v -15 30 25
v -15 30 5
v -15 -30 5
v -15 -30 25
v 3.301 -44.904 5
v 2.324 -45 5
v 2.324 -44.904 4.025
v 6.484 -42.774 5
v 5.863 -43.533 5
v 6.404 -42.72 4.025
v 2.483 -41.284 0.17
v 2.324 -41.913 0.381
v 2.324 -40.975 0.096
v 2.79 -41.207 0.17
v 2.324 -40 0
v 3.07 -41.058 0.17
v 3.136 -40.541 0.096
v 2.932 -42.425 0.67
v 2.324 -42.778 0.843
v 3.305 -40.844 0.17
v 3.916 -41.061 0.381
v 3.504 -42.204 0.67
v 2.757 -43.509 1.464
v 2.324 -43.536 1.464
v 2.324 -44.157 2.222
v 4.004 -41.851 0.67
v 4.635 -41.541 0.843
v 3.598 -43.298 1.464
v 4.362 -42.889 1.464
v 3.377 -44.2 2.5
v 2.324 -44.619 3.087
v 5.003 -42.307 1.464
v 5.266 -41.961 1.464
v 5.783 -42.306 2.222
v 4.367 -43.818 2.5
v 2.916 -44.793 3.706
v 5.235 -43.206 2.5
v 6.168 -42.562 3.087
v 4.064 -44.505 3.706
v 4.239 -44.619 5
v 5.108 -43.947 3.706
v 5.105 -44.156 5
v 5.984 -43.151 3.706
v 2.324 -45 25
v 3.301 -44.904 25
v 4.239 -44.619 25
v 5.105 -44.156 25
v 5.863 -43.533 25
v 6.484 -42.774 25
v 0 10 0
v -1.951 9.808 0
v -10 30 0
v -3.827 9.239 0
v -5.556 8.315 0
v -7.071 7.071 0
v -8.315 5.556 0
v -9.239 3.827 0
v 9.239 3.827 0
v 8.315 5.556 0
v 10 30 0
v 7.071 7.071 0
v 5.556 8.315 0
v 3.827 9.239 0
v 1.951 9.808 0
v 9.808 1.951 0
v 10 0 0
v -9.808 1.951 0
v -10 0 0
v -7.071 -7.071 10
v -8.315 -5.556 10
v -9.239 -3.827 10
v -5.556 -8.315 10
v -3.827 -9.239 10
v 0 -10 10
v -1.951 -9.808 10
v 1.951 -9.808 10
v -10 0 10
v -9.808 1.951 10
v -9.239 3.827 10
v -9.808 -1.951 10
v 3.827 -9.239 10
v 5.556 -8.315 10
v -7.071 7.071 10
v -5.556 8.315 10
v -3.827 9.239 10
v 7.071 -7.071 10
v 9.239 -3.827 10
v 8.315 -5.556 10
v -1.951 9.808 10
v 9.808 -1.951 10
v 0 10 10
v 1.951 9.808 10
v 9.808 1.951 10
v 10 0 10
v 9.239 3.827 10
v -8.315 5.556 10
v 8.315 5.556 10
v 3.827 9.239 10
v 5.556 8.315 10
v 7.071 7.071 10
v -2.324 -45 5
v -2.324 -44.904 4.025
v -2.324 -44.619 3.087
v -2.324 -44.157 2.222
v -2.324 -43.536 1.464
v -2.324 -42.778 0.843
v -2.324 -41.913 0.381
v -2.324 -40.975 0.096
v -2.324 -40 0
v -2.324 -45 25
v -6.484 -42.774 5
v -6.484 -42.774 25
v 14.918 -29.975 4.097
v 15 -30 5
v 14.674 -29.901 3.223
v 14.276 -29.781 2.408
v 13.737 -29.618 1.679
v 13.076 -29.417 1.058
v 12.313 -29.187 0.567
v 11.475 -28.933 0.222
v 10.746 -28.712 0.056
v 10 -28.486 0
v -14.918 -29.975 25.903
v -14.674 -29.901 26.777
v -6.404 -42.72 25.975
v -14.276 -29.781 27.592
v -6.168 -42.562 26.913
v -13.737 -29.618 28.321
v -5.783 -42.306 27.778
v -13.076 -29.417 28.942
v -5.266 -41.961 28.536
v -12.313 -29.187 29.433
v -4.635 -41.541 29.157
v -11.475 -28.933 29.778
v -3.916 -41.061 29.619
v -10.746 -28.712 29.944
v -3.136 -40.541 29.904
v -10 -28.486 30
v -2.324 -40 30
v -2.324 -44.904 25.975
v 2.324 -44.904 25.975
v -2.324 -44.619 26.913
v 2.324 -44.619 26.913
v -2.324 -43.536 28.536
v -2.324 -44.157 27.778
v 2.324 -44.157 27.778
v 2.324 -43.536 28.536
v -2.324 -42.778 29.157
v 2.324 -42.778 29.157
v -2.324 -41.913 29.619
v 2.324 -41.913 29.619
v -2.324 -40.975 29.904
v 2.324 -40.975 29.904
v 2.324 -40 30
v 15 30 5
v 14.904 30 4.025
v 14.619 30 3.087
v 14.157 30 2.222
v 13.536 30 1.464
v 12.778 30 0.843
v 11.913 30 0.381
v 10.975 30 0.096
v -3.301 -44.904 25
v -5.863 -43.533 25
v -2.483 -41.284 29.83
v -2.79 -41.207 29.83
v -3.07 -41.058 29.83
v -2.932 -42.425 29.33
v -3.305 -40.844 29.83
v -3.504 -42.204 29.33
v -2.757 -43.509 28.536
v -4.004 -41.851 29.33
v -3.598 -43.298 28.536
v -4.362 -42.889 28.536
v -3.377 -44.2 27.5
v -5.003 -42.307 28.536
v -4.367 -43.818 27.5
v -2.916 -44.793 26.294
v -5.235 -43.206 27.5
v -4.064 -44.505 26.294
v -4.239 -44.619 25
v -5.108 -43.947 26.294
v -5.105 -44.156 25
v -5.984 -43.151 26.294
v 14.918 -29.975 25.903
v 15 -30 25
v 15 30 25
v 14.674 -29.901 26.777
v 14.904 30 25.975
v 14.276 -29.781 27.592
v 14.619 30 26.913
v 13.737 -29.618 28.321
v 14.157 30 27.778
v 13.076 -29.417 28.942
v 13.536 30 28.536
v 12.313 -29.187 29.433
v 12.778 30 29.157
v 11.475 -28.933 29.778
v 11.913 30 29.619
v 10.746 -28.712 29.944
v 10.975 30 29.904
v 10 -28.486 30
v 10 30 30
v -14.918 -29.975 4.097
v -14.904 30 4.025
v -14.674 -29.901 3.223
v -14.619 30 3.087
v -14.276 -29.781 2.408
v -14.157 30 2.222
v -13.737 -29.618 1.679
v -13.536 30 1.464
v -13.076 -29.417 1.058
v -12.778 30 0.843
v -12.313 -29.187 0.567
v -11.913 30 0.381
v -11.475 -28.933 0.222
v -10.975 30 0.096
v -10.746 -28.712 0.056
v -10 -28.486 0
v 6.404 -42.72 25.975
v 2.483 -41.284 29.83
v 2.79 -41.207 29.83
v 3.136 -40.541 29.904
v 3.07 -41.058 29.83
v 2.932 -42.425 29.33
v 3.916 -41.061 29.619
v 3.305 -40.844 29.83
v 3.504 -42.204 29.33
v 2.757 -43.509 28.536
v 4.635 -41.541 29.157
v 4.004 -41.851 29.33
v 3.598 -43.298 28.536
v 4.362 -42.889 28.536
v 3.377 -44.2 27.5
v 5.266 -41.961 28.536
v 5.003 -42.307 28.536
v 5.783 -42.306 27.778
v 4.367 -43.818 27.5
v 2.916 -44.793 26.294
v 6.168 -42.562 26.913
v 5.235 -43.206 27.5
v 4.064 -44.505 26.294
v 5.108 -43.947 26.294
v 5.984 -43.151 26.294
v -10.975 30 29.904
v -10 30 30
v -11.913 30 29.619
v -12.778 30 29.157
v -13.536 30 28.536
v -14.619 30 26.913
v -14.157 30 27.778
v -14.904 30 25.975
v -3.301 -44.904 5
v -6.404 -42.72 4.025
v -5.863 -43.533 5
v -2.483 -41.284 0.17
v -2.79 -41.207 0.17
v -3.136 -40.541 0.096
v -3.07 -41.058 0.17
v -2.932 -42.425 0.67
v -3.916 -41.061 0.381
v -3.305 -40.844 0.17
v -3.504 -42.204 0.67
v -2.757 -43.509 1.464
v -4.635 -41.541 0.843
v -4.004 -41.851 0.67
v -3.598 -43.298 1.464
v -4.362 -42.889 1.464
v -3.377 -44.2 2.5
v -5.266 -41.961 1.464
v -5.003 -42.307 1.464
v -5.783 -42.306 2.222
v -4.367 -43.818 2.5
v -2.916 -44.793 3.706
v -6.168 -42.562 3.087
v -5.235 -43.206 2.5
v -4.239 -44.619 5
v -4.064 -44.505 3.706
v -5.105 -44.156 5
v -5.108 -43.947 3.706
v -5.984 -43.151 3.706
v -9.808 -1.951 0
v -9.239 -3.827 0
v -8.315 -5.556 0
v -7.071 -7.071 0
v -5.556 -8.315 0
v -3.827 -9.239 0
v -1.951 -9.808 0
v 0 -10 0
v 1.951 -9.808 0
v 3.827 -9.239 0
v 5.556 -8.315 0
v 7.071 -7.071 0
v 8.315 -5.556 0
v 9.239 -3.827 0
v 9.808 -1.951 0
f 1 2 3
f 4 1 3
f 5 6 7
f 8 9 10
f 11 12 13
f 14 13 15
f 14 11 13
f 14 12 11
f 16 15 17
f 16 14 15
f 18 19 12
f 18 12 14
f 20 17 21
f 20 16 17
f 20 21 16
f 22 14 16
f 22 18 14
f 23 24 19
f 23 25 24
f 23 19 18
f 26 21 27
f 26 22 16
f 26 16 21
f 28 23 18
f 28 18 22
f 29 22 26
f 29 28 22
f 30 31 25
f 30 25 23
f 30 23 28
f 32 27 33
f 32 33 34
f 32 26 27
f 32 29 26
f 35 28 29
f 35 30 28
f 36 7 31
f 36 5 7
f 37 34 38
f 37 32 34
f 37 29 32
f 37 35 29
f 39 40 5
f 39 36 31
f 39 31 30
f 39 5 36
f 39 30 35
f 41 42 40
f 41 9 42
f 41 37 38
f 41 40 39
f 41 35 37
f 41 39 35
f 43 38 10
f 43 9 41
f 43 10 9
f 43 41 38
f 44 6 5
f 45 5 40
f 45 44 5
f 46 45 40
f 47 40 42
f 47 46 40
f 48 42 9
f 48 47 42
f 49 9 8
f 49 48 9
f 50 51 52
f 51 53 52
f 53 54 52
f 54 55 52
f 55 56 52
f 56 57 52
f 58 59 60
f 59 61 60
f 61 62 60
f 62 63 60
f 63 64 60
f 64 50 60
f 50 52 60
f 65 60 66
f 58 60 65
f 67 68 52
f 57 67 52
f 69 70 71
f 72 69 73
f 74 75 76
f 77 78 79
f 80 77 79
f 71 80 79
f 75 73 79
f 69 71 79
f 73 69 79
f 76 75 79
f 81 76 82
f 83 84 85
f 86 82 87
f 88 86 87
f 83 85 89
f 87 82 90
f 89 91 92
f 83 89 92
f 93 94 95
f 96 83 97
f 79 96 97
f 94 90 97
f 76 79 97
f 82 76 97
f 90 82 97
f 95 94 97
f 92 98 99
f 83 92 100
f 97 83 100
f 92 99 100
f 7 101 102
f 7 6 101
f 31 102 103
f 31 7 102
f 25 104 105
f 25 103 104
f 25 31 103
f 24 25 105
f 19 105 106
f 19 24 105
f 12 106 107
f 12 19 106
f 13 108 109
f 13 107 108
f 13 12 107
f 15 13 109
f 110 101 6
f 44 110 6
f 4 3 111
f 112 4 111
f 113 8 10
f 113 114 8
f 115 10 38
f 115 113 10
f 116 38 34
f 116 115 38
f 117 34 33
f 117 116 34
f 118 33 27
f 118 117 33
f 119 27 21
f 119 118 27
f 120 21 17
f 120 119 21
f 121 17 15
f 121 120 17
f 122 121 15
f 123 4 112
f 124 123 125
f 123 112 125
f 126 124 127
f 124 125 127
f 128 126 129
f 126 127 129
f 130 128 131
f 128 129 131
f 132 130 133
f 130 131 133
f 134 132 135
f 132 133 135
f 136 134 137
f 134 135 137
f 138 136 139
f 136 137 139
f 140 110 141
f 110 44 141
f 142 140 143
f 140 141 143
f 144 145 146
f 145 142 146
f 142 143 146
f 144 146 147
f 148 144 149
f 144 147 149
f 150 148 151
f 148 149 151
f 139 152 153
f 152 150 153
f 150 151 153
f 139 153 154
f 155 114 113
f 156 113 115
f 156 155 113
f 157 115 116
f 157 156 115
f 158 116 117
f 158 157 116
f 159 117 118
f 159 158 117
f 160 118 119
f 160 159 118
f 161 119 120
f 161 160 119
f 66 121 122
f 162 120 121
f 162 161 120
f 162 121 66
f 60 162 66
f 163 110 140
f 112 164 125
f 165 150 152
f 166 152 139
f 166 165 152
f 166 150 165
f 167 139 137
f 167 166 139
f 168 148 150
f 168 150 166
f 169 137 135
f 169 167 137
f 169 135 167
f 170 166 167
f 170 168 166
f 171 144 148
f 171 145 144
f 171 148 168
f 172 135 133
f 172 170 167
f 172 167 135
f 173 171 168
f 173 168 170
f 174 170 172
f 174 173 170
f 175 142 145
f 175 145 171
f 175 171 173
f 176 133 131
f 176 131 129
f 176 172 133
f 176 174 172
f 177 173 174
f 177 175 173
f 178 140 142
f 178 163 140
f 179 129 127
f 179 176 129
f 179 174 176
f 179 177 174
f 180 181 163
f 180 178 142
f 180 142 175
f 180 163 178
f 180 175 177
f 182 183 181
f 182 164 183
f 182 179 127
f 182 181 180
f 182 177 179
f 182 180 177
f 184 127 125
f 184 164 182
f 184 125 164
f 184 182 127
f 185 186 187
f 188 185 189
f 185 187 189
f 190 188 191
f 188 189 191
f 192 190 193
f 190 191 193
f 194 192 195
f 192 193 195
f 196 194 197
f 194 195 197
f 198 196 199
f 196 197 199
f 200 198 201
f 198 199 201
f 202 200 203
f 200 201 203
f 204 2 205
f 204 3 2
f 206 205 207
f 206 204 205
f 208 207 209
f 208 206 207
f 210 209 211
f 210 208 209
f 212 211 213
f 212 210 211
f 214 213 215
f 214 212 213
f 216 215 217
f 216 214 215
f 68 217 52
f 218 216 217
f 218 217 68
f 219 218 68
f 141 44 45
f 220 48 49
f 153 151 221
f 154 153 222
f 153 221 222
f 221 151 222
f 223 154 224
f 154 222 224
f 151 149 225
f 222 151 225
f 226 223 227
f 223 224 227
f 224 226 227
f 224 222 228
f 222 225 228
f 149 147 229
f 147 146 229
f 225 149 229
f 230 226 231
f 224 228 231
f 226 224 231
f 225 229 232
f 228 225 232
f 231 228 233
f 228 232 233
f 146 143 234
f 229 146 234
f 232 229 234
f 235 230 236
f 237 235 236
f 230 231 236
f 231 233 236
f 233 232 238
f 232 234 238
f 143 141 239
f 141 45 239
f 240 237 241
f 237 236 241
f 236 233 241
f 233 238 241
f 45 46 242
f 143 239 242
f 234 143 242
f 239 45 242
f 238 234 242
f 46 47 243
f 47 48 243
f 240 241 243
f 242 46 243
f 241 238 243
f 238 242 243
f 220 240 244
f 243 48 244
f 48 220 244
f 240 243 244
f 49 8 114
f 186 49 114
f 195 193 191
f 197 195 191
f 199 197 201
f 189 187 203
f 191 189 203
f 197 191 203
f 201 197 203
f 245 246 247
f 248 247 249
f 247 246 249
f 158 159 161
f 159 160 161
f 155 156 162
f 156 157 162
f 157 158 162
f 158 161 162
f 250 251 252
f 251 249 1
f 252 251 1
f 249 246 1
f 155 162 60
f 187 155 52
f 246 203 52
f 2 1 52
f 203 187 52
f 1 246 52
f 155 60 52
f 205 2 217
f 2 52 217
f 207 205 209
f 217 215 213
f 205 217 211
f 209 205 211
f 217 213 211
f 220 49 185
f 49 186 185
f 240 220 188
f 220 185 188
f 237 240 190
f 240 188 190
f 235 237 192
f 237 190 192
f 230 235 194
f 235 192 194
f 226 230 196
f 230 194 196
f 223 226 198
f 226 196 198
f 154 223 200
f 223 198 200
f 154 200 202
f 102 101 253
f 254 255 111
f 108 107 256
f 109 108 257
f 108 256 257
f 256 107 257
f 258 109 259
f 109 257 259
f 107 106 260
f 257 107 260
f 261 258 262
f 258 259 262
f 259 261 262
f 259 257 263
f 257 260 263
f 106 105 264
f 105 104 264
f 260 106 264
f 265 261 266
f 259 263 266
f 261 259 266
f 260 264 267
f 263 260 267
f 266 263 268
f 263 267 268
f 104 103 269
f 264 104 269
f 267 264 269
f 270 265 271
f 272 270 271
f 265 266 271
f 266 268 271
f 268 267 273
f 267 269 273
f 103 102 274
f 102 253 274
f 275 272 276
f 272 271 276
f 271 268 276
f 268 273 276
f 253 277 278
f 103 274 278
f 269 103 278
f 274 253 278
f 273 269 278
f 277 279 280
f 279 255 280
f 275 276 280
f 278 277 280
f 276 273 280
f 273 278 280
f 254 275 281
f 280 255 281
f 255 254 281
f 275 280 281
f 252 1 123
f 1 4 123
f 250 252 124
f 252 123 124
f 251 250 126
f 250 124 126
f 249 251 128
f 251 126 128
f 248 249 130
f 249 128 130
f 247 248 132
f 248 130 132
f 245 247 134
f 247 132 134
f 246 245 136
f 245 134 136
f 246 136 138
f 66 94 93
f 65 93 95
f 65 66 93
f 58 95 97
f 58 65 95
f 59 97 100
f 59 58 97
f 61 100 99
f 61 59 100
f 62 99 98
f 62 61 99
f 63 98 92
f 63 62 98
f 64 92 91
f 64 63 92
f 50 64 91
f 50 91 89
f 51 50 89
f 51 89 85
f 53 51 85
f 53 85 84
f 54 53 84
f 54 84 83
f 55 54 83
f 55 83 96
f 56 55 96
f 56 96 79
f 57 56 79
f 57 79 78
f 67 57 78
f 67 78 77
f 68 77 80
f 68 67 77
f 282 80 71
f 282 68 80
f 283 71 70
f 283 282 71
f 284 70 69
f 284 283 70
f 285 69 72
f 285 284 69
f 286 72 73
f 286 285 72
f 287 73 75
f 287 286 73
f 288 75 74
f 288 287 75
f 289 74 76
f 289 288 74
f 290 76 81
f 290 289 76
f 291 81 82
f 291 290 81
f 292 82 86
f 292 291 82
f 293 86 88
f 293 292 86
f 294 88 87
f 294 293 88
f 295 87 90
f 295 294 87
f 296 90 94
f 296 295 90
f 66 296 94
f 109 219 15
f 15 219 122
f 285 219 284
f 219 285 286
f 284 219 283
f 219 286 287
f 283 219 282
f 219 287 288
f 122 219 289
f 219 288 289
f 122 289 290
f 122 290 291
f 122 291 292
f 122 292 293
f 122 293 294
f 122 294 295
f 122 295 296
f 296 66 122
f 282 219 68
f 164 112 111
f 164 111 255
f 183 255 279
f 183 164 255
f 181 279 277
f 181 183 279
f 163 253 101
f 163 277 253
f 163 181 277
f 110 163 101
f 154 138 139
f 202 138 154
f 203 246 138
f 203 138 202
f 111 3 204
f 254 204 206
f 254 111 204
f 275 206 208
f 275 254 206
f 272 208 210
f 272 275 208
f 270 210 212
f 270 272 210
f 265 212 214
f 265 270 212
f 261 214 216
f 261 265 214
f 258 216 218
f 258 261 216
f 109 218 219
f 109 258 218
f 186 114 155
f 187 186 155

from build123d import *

# Parameters (mm, degrees)
F0_R     = 10
F1_DEPTH = 30
F2_R     = 5
F3_DEPTH = 10


with BuildPart() as f1:
    # F0 (on Top) → F1 (new body)
    with BuildSketch(Plane.XY):
        Polygon((15, 30), (-15, 30), (-15, -30), (0, -30), (15, -30), align=None)
        Circle(F0_R, mode=Mode.SUBTRACT)
        Polygon((0, -30), (-15, -30), (-5, -45), (0, -45), align=None)
        Polygon((5, -45), (15, -30), (0, -30), (0, -45), align=None)
        Circle(F0_R)
    extrude(amount=F1_DEPTH)

    # F2
    f2_edges = [f1.edges().sort_by_distance(p)[0] for p in [
        (15, 0, 0),
        (-15, 0, 0),
        (-15, 0, 30),
        (15, 0, 30),
        (-10, -37.5, 30),
        (10, -37.5, 30),
        (-5, -45, 15),
        (5, -45, 15),
        (0, -45, 0),
        (0, -45, 30),
        (10, -37.5, 0),
        (-10, -37.5, 0),
    ]]
    fillet(f2_edges, radius=F2_R)

    # F0 (on Top) → F3 (cut)
    with BuildSketch(Plane.XY):
        Circle(F0_R)
    extrude(amount=F3_DEPTH, mode=Mode.SUBTRACT)


solid = f1.part
